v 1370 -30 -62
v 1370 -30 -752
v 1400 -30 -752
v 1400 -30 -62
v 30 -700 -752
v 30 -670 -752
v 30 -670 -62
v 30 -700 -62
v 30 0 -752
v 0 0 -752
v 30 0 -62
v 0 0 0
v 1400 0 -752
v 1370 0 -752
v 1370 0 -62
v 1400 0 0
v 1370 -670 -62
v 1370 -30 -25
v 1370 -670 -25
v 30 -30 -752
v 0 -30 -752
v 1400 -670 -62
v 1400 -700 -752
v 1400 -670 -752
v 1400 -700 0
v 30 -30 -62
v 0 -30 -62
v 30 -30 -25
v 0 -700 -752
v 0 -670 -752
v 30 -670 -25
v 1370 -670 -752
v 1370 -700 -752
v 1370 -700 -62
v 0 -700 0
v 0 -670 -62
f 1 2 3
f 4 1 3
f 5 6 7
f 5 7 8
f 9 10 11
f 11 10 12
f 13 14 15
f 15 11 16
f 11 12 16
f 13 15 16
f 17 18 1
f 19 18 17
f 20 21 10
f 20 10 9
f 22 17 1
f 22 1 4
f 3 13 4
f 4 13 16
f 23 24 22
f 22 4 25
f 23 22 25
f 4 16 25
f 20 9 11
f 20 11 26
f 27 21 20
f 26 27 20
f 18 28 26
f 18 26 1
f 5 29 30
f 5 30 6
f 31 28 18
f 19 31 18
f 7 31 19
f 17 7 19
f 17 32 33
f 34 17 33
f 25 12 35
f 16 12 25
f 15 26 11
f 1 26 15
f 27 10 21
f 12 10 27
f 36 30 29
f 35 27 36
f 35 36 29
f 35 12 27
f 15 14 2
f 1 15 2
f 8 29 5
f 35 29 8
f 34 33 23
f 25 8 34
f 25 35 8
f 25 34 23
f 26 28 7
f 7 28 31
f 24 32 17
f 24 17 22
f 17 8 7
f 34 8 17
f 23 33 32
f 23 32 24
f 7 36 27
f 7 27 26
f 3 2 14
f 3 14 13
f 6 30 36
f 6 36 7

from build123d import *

# Parameters (mm, degrees)
F0_W     = 1400
F0_H     = 700
F1_DEPTH = 25
F2_W     = 1400
F2_H     = 700
F2_W_2   = 1340
F2_H_2   = 640
F3_DEPTH = 37
F4_W     = 30
F4_H     = 30
F5_DEPTH = 690


with BuildPart() as f1:
    # F0 (on Top) → F1 (new body)
    with BuildSketch(Plane.XY):
        with Locations((700, -350)):
            Rectangle(F0_W, F0_H)
    extrude(amount=-F1_DEPTH)

    # F2 (on face) → F3 (join)
    with BuildSketch(Plane(origin=(0, 0, -25), x_dir=(1, 0, 0), z_dir=(0, 0, -1))):
        with Locations((700, 350)):
            Rectangle(F2_W, F2_H)
        with Locations((700, 350)):
            Rectangle(F2_W_2, F2_H_2, mode=Mode.SUBTRACT)
    extrude(amount=F3_DEPTH)

    # F4 (on face) → F5 (join)
    with BuildSketch(Plane(origin=(0, 0, -62), x_dir=(1, 0, 0), z_dir=(0, 0, -1))):
        with Locations((15, 685)):
            Rectangle(F4_W, F4_H)
        with Locations((15, 15)):
            Rectangle(F4_W, F4_H)
        with Locations((1385, 685)):
            Rectangle(F4_W, F4_H)
        with Locations((1385, 15)):
            Rectangle(F4_W, F4_H)
    extrude(amount=F5_DEPTH)


solid = f1.part
